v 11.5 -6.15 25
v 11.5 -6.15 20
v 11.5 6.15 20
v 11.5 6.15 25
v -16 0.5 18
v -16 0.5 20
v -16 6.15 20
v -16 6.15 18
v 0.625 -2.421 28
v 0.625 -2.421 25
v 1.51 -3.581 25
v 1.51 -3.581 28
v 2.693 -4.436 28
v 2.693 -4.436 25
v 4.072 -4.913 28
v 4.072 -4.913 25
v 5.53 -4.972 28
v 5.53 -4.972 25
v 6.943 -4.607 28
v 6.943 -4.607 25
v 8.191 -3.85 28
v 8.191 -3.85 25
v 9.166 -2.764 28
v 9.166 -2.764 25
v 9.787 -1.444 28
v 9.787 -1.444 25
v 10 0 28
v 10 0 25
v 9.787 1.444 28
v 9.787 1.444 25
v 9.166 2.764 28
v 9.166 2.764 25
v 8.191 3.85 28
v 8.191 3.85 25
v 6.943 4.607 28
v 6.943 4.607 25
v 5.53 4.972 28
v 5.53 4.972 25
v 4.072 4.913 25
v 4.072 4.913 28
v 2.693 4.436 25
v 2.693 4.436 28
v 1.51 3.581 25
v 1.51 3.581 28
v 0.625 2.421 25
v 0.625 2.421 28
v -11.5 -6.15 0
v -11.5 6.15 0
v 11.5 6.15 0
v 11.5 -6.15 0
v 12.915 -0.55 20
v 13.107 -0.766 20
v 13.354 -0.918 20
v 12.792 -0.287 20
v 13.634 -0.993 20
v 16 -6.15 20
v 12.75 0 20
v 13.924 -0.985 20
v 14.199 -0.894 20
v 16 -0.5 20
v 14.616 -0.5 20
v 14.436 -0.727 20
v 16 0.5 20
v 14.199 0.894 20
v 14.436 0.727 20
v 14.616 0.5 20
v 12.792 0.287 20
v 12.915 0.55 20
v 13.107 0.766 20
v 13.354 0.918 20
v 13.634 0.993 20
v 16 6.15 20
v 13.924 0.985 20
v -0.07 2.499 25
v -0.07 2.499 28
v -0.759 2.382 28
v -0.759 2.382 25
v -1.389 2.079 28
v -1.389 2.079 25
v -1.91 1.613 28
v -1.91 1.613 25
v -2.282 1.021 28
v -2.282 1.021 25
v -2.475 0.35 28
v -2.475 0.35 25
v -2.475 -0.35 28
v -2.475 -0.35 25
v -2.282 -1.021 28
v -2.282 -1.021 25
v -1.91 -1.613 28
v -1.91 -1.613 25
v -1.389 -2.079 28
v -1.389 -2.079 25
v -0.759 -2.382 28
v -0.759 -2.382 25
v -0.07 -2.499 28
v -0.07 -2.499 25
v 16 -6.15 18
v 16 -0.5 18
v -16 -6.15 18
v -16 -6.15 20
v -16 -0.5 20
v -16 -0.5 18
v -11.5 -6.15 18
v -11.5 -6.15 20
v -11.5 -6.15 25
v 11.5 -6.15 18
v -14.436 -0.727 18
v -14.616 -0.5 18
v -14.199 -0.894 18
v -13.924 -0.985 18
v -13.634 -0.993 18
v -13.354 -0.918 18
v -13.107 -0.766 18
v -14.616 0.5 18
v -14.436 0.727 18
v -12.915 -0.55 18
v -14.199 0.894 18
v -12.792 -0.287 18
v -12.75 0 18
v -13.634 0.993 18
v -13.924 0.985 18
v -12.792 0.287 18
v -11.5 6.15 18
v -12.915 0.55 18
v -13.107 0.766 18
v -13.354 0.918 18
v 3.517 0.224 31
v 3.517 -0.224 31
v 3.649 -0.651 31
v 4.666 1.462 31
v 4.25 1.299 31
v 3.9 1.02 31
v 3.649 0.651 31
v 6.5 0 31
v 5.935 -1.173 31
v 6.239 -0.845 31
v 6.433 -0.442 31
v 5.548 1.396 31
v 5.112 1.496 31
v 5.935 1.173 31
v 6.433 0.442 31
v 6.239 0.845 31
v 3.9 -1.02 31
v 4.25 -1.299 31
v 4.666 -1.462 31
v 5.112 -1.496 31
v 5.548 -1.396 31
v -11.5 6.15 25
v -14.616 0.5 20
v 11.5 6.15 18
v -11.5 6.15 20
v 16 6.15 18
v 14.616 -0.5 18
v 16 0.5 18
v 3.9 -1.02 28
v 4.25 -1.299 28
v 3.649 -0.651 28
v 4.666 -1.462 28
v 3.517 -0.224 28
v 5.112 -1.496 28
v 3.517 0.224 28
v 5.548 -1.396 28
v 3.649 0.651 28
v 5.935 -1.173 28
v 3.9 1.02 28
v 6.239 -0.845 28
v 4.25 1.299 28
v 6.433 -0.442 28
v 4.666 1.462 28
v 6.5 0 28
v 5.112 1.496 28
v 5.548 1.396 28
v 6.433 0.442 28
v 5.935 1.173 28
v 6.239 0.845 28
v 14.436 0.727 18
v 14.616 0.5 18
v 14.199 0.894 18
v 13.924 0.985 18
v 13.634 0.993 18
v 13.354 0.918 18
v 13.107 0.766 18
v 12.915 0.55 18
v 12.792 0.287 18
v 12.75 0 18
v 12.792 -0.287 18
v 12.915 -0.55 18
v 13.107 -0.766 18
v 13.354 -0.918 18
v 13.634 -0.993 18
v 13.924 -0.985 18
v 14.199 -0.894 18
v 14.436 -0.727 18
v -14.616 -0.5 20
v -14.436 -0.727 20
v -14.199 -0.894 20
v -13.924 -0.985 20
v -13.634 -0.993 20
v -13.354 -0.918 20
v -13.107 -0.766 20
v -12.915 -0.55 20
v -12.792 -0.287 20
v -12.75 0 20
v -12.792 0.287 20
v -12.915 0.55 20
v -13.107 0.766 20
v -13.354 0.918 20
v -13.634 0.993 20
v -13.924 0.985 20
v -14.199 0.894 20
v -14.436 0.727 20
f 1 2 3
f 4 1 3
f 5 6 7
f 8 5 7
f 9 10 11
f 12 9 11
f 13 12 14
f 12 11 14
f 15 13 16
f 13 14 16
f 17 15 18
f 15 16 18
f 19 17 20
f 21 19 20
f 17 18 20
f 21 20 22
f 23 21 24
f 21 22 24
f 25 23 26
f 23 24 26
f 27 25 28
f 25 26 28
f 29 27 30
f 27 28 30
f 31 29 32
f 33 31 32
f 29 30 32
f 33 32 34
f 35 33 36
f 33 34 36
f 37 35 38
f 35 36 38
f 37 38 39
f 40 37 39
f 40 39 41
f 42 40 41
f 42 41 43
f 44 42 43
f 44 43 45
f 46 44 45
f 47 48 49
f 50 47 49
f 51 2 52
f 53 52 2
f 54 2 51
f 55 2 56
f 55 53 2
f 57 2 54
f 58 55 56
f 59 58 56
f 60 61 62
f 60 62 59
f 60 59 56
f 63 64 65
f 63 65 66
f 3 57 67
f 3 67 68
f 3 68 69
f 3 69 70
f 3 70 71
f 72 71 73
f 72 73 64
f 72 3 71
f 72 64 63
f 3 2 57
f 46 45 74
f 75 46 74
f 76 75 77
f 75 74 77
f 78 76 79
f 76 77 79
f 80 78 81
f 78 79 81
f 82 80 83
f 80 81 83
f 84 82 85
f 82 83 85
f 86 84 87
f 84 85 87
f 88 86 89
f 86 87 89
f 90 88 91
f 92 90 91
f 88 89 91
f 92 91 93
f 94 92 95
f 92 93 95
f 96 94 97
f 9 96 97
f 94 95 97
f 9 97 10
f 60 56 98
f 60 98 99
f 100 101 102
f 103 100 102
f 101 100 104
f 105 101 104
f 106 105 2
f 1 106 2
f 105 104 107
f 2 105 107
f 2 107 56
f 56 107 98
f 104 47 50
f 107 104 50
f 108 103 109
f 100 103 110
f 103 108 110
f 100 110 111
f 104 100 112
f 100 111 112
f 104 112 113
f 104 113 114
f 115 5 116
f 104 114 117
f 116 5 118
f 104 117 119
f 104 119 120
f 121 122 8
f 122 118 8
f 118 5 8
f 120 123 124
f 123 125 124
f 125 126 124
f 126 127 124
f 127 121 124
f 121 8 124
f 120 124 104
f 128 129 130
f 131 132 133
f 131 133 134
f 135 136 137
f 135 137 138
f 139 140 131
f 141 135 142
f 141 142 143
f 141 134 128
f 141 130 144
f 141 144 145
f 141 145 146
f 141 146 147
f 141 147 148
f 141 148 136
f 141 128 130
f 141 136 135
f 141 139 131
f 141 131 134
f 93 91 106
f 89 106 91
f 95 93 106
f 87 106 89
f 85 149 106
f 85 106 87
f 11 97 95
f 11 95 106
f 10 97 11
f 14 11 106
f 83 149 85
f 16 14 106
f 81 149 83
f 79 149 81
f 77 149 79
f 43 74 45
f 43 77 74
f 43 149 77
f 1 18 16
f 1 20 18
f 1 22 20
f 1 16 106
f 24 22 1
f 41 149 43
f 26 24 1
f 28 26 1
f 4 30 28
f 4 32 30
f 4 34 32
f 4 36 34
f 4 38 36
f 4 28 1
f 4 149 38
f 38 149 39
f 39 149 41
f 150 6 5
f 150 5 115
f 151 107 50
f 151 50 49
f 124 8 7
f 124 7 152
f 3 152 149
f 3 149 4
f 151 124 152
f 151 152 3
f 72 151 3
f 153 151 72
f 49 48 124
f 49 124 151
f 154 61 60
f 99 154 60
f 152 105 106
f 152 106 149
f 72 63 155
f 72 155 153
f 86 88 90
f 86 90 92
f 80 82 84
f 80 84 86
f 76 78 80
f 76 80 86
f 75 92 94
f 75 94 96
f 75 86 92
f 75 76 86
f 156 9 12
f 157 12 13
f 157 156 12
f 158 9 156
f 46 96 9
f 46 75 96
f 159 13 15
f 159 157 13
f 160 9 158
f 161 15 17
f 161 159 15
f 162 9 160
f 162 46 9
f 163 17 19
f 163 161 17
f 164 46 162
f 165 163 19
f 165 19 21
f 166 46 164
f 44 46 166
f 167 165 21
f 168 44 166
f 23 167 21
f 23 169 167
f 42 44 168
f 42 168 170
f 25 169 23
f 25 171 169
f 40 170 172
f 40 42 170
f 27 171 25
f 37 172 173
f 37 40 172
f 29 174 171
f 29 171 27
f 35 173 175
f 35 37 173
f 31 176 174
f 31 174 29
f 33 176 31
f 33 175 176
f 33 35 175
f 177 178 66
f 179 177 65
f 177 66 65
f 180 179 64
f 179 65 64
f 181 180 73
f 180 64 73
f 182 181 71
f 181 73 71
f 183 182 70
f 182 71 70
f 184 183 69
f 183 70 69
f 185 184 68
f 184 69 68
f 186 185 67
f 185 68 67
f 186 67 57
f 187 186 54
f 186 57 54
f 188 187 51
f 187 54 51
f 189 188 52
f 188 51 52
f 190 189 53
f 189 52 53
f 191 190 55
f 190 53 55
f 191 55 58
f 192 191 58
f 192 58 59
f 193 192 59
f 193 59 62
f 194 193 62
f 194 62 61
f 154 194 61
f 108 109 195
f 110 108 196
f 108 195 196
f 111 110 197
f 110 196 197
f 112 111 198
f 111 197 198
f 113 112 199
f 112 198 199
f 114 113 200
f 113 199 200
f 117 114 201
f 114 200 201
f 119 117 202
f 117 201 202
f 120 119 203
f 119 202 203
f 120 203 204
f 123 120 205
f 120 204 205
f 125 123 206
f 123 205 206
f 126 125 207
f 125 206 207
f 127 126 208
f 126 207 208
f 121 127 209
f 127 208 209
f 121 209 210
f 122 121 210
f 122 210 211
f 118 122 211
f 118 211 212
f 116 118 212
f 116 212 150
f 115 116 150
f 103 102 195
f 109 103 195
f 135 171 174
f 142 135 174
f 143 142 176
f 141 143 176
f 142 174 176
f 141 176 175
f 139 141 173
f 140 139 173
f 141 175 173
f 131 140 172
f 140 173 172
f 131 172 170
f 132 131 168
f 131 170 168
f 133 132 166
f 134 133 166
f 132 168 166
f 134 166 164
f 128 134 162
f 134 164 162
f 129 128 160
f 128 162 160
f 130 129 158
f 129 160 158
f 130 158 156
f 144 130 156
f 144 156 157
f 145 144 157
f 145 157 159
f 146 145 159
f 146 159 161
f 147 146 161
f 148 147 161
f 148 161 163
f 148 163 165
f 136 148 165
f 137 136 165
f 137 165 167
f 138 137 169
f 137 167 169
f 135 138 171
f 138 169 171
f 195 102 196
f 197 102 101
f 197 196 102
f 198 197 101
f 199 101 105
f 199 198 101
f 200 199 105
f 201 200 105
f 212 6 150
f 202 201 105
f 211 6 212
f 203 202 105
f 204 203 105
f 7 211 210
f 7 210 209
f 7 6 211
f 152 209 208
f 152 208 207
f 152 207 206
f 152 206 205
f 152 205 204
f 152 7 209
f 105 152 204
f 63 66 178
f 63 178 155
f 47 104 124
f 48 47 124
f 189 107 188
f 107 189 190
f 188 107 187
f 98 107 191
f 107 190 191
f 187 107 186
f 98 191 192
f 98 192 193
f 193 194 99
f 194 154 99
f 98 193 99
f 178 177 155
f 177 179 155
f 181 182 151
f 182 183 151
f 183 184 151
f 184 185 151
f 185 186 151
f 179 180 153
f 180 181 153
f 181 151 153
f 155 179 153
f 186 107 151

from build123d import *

# Parameters (mm, degrees)
SKETCH_1_W          = 23
SKETCH_1_H          = 12.3
EXTRUDE_1_DEPTH     = 25
SKETCH_3_R          = 5
SKETCH_3_R_2        = 2.5
EXTRUDE_2_DEPTH     = 3
SKETCH_4_R          = 1.5
EXTRUDE_3_DEPTH     = 3
EXTRUDE_START       = -5
SKETCH_5_W          = 4.5
SKETCH_5_H          = 12.3
EXTRUDE_4_DEPTH     = 2
SKETCH_6_R          = 1
CUT_EXTRUDE_1_DEPTH = 3
SKETCH_7_W          = 1.383974596
SKETCH_7_H          = 1
CUT_EXTRUDE_2_DEPTH = 10


with BuildPart() as part:
    # 草图1 → 凸台-拉伸1 (new body)
    with BuildSketch(Plane.XY):
        Rectangle(SKETCH_1_W, SKETCH_1_H)
    extrude(amount=EXTRUDE_1_DEPTH)

    # 草图3 → 凸台-拉伸2 (add)
    with BuildSketch(Plane.XY.offset(25)):
        with Locations((5, 0)):
            Circle(SKETCH_3_R)
        Circle(SKETCH_3_R_2)
    extrude(amount=EXTRUDE_2_DEPTH)

    # 草图4 → 凸台-拉伸3 (add)
    with BuildSketch(Plane.XY.offset(28)):
        with Locations((5, 0)):
            Circle(SKETCH_4_R)
    extrude(amount=EXTRUDE_3_DEPTH)

    # 草图5 → 凸台-拉伸4 (add)
    with BuildSketch(Plane.XY.offset(25).offset(EXTRUDE_START)):
        with Locations((-13.75, 0)):
            Rectangle(SKETCH_5_W, SKETCH_5_H)
        with Locations((13.75, 0)):
            Rectangle(SKETCH_5_W, SKETCH_5_H)
    extrude(amount=-EXTRUDE_4_DEPTH)

    # 草图6 → 切除-拉伸1 (cut)
    with BuildSketch(Plane.XY.offset(20)):
        with Locations((-13.75, 0)):
            Circle(SKETCH_6_R)
        with Locations(Location((13.75, 0, 0), (0, 0, 180))):
            Circle(SKETCH_6_R)
    extrude(amount=-CUT_EXTRUDE_1_DEPTH, mode=Mode.SUBTRACT)

    # 草图7 → 切除-拉伸2 (cut)
    with BuildSketch(Plane.XY.offset(20)):
        with Locations((-15.308012702, 0)):
            Rectangle(SKETCH_7_W, SKETCH_7_H)
        with Locations((15.308012702, 0)):
            Rectangle(SKETCH_7_W, SKETCH_7_H)
    extrude(amount=-CUT_EXTRUDE_2_DEPTH, mode=Mode.SUBTRACT)


solid = part.part
